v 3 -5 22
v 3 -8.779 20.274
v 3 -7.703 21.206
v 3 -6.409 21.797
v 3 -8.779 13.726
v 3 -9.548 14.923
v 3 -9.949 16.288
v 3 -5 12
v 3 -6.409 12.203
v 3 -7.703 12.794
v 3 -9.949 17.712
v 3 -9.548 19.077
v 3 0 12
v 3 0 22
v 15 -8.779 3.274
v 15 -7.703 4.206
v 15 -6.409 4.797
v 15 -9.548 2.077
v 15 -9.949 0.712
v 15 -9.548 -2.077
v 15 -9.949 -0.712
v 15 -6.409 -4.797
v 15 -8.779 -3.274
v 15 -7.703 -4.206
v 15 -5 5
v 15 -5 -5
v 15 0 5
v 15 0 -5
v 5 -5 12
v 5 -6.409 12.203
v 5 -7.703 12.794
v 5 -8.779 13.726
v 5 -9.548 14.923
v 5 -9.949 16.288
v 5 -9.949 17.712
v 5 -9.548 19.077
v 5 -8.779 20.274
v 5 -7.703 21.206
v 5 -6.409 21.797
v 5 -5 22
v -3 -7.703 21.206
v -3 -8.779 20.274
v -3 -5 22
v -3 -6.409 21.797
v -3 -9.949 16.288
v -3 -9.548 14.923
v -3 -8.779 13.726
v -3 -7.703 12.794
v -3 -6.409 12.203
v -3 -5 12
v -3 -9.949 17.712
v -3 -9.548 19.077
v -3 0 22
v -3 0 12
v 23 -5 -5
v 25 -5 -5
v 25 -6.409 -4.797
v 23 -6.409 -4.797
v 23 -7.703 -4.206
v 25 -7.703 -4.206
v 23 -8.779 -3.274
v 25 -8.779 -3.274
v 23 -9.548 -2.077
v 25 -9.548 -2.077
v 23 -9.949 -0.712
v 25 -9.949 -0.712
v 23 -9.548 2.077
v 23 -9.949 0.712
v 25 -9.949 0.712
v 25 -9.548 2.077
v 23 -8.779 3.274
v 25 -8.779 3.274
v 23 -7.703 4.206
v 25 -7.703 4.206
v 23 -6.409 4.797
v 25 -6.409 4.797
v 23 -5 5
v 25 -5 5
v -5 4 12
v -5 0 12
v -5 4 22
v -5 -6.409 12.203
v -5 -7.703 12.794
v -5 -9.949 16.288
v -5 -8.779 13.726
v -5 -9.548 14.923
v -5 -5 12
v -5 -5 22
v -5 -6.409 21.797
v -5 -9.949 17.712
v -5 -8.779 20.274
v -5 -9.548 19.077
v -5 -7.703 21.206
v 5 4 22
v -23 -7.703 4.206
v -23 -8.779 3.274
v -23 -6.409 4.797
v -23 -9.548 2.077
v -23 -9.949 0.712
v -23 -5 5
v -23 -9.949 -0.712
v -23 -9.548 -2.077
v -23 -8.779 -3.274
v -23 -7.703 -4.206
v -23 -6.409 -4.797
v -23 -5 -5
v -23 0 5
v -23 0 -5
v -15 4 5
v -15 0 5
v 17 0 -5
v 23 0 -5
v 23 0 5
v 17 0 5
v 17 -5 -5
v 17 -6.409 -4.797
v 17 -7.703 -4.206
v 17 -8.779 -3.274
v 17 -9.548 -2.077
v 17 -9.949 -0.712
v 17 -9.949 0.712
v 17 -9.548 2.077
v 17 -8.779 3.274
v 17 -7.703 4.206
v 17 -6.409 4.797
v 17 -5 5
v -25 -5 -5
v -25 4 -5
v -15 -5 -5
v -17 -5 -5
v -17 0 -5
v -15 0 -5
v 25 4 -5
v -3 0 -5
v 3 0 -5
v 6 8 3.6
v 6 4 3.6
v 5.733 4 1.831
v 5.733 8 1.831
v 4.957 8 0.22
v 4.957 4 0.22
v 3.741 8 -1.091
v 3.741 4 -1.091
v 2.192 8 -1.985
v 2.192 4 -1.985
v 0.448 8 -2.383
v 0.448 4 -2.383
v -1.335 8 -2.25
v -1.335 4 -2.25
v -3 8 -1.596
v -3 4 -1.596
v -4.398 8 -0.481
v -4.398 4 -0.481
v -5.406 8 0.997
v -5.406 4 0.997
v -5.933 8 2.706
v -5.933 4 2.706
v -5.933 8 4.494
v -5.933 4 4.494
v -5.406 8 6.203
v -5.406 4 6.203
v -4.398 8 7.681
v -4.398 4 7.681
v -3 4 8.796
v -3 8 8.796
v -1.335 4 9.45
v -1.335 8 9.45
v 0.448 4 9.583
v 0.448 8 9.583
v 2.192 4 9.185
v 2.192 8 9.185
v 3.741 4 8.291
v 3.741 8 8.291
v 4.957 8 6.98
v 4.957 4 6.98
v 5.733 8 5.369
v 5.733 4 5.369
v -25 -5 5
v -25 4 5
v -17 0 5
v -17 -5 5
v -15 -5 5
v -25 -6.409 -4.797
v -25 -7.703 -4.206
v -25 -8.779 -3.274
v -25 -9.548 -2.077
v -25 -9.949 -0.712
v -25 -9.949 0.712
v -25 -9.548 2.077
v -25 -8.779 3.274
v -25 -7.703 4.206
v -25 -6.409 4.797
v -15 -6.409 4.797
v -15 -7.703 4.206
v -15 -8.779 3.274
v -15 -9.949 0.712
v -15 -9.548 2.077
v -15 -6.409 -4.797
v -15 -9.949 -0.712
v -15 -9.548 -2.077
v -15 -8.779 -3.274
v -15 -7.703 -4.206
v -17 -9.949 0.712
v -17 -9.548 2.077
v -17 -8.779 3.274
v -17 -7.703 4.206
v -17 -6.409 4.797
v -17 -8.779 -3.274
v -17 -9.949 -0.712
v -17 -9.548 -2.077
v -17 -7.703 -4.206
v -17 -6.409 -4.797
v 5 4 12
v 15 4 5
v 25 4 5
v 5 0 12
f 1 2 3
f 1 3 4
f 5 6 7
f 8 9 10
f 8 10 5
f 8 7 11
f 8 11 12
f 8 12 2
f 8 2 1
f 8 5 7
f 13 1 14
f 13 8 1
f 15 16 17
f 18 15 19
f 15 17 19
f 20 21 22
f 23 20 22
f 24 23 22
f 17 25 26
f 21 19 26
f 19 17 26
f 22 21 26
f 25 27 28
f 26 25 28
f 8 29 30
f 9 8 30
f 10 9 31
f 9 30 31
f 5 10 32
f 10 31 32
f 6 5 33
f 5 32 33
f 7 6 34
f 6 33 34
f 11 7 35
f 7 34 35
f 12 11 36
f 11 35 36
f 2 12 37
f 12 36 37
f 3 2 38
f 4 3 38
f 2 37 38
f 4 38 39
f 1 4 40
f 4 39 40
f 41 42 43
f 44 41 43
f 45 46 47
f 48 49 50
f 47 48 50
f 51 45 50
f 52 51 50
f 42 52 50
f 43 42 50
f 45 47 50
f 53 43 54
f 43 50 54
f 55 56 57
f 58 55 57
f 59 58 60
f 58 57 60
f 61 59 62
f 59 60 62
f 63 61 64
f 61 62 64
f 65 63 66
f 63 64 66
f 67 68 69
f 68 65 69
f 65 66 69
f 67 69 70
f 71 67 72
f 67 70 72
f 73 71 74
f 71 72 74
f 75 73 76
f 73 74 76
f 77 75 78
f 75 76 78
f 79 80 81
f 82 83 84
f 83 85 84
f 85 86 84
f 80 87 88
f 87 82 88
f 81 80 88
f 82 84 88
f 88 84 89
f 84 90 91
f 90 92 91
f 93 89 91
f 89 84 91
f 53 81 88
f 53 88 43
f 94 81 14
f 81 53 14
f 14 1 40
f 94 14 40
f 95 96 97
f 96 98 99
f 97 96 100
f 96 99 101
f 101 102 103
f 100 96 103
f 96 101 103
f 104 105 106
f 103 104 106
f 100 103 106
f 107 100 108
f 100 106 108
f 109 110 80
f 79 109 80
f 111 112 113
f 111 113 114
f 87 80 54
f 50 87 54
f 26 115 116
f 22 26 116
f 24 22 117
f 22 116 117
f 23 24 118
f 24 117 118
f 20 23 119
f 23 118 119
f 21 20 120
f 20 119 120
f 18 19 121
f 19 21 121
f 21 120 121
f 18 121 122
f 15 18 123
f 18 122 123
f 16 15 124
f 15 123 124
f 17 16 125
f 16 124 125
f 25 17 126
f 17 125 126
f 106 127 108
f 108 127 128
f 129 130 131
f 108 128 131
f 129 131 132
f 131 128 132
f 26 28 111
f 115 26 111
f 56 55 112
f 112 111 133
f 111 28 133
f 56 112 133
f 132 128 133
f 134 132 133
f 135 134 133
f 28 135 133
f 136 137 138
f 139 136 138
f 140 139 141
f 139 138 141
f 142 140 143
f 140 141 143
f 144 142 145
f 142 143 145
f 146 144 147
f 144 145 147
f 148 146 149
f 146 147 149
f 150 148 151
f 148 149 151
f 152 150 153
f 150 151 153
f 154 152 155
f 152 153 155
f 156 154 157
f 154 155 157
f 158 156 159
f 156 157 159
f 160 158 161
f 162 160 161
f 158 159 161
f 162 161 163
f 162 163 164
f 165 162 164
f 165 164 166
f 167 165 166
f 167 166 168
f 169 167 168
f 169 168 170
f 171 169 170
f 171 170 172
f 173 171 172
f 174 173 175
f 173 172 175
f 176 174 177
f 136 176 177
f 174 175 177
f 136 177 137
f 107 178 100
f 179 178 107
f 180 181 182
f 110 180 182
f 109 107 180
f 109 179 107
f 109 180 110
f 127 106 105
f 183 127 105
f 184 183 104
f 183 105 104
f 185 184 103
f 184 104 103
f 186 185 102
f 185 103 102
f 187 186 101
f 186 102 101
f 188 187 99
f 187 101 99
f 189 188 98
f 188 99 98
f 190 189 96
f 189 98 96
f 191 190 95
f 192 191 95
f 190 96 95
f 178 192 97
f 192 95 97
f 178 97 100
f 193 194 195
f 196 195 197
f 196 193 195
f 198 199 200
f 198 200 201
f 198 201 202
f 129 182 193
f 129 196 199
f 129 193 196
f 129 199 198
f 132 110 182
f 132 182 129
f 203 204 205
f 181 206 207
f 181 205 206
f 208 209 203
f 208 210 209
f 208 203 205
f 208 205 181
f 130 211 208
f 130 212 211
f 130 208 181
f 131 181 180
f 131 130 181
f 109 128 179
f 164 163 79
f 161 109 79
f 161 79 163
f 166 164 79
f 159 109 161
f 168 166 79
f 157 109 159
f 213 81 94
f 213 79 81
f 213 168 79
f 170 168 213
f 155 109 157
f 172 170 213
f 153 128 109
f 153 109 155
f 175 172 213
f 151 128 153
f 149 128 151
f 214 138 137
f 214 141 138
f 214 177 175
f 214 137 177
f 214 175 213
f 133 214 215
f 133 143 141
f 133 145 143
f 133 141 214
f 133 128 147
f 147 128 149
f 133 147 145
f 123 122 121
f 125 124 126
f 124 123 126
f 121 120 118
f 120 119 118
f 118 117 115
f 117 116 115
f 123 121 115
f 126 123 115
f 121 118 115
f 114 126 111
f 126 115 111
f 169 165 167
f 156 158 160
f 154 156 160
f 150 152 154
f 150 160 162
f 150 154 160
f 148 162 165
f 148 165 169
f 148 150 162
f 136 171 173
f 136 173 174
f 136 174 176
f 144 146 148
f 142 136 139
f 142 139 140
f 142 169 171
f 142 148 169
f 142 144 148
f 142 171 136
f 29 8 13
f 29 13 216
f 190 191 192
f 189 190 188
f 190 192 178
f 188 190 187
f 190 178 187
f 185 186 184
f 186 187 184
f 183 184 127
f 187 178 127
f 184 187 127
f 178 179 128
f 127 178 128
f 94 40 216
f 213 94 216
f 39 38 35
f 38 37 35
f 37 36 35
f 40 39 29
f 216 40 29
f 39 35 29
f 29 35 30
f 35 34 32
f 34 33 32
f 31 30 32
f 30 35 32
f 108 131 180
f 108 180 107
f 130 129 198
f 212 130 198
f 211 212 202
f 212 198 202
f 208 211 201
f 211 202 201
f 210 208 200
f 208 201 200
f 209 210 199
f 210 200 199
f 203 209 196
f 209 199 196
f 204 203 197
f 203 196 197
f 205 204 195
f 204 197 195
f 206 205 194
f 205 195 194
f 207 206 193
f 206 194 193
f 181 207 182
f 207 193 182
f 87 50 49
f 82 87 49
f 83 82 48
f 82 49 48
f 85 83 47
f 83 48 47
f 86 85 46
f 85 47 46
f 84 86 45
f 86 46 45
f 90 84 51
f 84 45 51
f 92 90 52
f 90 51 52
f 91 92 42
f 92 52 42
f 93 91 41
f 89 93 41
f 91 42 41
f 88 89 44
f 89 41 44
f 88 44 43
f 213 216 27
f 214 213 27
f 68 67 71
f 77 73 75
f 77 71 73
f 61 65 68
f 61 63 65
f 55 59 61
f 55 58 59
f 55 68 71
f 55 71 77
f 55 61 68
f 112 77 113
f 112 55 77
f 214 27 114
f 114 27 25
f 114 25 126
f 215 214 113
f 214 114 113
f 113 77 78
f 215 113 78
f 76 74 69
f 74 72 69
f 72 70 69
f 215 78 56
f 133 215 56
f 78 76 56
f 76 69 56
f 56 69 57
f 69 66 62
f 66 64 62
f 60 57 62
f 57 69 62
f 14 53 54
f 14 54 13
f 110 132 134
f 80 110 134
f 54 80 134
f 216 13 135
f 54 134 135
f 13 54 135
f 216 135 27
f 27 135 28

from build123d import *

# Parameters (mm, degrees)
EXTRUDE_1_DEPTH     = 4
SKETCH_1_W          = 10
SKETCH_1_H          = 10
EXTRUDE_2_DEPTH     = 10
SKETCH_3_W          = 6
SKETCH_3_H          = 12.745836759
SKETCH_3_H_2        = 13.387334875
CUT_EXTRUDE_1_DEPTH = 28
CUT_EXTRUDE_2_DEPTH = 51
SKETCH_5_R          = 6
EXTRUDE_3_DEPTH     = 4


with BuildPart() as part:
    # 草图2 → 凸台-拉伸1 (new body)
    with BuildSketch(Plane(origin=(0, 0, 0), x_dir=(1, 0, 0), z_dir=(0, 1, 0))):
        Polygon((-5, -22), (5, -22), (5, -12), (15, -5), (25, -5), (25, 5), (-25, 5), (-25, -5), (-15, -5), (-5, -12), align=None)
    extrude(amount=EXTRUDE_1_DEPTH)

    # 草图1 → 凸台-拉伸2 (add)
    with BuildSketch(Plane(origin=(0, 0, 0), x_dir=(1, 0, 0), z_dir=(0, 1, 0))):
        with Locations((-20, 0)):
            Rectangle(SKETCH_1_W, SKETCH_1_H)
        with Locations((20, 0)):
            Rectangle(SKETCH_1_W, SKETCH_1_H)
        with Locations((0, -17)):
            Rectangle(SKETCH_1_W, SKETCH_1_H)
    extrude(amount=-EXTRUDE_2_DEPTH)

    # 草图3 → 切除-拉伸1 (cut, through all)
    with BuildSketch(Plane(origin=(0, 0, -5), x_dir=(-1, 0, 0), z_dir=(0, 0, -1))):
        with Locations((-20, -6.37291838)):
            Rectangle(SKETCH_3_W, SKETCH_3_H)
        with Locations((0, -6.37291838)):
            Rectangle(SKETCH_3_W, SKETCH_3_H)
        with Locations((20, -6.693667438)):
            Rectangle(SKETCH_3_W, SKETCH_3_H_2)
    extrude(amount=-CUT_EXTRUDE_1_DEPTH, mode=Mode.SUBTRACT)

    # 草图4 → 切除-拉伸2 (cut, through all)
    with BuildSketch(Plane(origin=(25, 0, 0), x_dir=(0, 0, -1), z_dir=(1, 0, 0))):
        with BuildLine():
            Line((-22, -5), (-22, -12.80603889))
            Line((-22, -12.80603889), (-12, -12.80603889))
            Line((-12, -12.80603889), (-12, -5))
            ThreePointArc((-12, -5), (-17, -10), (-22, -5))
        make_face()
        with BuildLine():
            Line((-5, -5), (-5, -13.738678459))
            Line((-5, -13.738678459), (5, -13.738678459))
            Line((5, -13.738678459), (5, -5))
            ThreePointArc((5, -5), (0, -10), (-5, -5))
        make_face()
    extrude(amount=-CUT_EXTRUDE_2_DEPTH, mode=Mode.SUBTRACT)

    # 草图5 → 凸台-拉伸3 (add)
    with BuildSketch(Plane(origin=(0, 4, 0), x_dir=(1, 0, 0), z_dir=(0, 1, 0))):
        with Locations((0, -3.6)):
            Circle(SKETCH_5_R)
    extrude(amount=EXTRUDE_3_DEPTH)


solid = part.part
